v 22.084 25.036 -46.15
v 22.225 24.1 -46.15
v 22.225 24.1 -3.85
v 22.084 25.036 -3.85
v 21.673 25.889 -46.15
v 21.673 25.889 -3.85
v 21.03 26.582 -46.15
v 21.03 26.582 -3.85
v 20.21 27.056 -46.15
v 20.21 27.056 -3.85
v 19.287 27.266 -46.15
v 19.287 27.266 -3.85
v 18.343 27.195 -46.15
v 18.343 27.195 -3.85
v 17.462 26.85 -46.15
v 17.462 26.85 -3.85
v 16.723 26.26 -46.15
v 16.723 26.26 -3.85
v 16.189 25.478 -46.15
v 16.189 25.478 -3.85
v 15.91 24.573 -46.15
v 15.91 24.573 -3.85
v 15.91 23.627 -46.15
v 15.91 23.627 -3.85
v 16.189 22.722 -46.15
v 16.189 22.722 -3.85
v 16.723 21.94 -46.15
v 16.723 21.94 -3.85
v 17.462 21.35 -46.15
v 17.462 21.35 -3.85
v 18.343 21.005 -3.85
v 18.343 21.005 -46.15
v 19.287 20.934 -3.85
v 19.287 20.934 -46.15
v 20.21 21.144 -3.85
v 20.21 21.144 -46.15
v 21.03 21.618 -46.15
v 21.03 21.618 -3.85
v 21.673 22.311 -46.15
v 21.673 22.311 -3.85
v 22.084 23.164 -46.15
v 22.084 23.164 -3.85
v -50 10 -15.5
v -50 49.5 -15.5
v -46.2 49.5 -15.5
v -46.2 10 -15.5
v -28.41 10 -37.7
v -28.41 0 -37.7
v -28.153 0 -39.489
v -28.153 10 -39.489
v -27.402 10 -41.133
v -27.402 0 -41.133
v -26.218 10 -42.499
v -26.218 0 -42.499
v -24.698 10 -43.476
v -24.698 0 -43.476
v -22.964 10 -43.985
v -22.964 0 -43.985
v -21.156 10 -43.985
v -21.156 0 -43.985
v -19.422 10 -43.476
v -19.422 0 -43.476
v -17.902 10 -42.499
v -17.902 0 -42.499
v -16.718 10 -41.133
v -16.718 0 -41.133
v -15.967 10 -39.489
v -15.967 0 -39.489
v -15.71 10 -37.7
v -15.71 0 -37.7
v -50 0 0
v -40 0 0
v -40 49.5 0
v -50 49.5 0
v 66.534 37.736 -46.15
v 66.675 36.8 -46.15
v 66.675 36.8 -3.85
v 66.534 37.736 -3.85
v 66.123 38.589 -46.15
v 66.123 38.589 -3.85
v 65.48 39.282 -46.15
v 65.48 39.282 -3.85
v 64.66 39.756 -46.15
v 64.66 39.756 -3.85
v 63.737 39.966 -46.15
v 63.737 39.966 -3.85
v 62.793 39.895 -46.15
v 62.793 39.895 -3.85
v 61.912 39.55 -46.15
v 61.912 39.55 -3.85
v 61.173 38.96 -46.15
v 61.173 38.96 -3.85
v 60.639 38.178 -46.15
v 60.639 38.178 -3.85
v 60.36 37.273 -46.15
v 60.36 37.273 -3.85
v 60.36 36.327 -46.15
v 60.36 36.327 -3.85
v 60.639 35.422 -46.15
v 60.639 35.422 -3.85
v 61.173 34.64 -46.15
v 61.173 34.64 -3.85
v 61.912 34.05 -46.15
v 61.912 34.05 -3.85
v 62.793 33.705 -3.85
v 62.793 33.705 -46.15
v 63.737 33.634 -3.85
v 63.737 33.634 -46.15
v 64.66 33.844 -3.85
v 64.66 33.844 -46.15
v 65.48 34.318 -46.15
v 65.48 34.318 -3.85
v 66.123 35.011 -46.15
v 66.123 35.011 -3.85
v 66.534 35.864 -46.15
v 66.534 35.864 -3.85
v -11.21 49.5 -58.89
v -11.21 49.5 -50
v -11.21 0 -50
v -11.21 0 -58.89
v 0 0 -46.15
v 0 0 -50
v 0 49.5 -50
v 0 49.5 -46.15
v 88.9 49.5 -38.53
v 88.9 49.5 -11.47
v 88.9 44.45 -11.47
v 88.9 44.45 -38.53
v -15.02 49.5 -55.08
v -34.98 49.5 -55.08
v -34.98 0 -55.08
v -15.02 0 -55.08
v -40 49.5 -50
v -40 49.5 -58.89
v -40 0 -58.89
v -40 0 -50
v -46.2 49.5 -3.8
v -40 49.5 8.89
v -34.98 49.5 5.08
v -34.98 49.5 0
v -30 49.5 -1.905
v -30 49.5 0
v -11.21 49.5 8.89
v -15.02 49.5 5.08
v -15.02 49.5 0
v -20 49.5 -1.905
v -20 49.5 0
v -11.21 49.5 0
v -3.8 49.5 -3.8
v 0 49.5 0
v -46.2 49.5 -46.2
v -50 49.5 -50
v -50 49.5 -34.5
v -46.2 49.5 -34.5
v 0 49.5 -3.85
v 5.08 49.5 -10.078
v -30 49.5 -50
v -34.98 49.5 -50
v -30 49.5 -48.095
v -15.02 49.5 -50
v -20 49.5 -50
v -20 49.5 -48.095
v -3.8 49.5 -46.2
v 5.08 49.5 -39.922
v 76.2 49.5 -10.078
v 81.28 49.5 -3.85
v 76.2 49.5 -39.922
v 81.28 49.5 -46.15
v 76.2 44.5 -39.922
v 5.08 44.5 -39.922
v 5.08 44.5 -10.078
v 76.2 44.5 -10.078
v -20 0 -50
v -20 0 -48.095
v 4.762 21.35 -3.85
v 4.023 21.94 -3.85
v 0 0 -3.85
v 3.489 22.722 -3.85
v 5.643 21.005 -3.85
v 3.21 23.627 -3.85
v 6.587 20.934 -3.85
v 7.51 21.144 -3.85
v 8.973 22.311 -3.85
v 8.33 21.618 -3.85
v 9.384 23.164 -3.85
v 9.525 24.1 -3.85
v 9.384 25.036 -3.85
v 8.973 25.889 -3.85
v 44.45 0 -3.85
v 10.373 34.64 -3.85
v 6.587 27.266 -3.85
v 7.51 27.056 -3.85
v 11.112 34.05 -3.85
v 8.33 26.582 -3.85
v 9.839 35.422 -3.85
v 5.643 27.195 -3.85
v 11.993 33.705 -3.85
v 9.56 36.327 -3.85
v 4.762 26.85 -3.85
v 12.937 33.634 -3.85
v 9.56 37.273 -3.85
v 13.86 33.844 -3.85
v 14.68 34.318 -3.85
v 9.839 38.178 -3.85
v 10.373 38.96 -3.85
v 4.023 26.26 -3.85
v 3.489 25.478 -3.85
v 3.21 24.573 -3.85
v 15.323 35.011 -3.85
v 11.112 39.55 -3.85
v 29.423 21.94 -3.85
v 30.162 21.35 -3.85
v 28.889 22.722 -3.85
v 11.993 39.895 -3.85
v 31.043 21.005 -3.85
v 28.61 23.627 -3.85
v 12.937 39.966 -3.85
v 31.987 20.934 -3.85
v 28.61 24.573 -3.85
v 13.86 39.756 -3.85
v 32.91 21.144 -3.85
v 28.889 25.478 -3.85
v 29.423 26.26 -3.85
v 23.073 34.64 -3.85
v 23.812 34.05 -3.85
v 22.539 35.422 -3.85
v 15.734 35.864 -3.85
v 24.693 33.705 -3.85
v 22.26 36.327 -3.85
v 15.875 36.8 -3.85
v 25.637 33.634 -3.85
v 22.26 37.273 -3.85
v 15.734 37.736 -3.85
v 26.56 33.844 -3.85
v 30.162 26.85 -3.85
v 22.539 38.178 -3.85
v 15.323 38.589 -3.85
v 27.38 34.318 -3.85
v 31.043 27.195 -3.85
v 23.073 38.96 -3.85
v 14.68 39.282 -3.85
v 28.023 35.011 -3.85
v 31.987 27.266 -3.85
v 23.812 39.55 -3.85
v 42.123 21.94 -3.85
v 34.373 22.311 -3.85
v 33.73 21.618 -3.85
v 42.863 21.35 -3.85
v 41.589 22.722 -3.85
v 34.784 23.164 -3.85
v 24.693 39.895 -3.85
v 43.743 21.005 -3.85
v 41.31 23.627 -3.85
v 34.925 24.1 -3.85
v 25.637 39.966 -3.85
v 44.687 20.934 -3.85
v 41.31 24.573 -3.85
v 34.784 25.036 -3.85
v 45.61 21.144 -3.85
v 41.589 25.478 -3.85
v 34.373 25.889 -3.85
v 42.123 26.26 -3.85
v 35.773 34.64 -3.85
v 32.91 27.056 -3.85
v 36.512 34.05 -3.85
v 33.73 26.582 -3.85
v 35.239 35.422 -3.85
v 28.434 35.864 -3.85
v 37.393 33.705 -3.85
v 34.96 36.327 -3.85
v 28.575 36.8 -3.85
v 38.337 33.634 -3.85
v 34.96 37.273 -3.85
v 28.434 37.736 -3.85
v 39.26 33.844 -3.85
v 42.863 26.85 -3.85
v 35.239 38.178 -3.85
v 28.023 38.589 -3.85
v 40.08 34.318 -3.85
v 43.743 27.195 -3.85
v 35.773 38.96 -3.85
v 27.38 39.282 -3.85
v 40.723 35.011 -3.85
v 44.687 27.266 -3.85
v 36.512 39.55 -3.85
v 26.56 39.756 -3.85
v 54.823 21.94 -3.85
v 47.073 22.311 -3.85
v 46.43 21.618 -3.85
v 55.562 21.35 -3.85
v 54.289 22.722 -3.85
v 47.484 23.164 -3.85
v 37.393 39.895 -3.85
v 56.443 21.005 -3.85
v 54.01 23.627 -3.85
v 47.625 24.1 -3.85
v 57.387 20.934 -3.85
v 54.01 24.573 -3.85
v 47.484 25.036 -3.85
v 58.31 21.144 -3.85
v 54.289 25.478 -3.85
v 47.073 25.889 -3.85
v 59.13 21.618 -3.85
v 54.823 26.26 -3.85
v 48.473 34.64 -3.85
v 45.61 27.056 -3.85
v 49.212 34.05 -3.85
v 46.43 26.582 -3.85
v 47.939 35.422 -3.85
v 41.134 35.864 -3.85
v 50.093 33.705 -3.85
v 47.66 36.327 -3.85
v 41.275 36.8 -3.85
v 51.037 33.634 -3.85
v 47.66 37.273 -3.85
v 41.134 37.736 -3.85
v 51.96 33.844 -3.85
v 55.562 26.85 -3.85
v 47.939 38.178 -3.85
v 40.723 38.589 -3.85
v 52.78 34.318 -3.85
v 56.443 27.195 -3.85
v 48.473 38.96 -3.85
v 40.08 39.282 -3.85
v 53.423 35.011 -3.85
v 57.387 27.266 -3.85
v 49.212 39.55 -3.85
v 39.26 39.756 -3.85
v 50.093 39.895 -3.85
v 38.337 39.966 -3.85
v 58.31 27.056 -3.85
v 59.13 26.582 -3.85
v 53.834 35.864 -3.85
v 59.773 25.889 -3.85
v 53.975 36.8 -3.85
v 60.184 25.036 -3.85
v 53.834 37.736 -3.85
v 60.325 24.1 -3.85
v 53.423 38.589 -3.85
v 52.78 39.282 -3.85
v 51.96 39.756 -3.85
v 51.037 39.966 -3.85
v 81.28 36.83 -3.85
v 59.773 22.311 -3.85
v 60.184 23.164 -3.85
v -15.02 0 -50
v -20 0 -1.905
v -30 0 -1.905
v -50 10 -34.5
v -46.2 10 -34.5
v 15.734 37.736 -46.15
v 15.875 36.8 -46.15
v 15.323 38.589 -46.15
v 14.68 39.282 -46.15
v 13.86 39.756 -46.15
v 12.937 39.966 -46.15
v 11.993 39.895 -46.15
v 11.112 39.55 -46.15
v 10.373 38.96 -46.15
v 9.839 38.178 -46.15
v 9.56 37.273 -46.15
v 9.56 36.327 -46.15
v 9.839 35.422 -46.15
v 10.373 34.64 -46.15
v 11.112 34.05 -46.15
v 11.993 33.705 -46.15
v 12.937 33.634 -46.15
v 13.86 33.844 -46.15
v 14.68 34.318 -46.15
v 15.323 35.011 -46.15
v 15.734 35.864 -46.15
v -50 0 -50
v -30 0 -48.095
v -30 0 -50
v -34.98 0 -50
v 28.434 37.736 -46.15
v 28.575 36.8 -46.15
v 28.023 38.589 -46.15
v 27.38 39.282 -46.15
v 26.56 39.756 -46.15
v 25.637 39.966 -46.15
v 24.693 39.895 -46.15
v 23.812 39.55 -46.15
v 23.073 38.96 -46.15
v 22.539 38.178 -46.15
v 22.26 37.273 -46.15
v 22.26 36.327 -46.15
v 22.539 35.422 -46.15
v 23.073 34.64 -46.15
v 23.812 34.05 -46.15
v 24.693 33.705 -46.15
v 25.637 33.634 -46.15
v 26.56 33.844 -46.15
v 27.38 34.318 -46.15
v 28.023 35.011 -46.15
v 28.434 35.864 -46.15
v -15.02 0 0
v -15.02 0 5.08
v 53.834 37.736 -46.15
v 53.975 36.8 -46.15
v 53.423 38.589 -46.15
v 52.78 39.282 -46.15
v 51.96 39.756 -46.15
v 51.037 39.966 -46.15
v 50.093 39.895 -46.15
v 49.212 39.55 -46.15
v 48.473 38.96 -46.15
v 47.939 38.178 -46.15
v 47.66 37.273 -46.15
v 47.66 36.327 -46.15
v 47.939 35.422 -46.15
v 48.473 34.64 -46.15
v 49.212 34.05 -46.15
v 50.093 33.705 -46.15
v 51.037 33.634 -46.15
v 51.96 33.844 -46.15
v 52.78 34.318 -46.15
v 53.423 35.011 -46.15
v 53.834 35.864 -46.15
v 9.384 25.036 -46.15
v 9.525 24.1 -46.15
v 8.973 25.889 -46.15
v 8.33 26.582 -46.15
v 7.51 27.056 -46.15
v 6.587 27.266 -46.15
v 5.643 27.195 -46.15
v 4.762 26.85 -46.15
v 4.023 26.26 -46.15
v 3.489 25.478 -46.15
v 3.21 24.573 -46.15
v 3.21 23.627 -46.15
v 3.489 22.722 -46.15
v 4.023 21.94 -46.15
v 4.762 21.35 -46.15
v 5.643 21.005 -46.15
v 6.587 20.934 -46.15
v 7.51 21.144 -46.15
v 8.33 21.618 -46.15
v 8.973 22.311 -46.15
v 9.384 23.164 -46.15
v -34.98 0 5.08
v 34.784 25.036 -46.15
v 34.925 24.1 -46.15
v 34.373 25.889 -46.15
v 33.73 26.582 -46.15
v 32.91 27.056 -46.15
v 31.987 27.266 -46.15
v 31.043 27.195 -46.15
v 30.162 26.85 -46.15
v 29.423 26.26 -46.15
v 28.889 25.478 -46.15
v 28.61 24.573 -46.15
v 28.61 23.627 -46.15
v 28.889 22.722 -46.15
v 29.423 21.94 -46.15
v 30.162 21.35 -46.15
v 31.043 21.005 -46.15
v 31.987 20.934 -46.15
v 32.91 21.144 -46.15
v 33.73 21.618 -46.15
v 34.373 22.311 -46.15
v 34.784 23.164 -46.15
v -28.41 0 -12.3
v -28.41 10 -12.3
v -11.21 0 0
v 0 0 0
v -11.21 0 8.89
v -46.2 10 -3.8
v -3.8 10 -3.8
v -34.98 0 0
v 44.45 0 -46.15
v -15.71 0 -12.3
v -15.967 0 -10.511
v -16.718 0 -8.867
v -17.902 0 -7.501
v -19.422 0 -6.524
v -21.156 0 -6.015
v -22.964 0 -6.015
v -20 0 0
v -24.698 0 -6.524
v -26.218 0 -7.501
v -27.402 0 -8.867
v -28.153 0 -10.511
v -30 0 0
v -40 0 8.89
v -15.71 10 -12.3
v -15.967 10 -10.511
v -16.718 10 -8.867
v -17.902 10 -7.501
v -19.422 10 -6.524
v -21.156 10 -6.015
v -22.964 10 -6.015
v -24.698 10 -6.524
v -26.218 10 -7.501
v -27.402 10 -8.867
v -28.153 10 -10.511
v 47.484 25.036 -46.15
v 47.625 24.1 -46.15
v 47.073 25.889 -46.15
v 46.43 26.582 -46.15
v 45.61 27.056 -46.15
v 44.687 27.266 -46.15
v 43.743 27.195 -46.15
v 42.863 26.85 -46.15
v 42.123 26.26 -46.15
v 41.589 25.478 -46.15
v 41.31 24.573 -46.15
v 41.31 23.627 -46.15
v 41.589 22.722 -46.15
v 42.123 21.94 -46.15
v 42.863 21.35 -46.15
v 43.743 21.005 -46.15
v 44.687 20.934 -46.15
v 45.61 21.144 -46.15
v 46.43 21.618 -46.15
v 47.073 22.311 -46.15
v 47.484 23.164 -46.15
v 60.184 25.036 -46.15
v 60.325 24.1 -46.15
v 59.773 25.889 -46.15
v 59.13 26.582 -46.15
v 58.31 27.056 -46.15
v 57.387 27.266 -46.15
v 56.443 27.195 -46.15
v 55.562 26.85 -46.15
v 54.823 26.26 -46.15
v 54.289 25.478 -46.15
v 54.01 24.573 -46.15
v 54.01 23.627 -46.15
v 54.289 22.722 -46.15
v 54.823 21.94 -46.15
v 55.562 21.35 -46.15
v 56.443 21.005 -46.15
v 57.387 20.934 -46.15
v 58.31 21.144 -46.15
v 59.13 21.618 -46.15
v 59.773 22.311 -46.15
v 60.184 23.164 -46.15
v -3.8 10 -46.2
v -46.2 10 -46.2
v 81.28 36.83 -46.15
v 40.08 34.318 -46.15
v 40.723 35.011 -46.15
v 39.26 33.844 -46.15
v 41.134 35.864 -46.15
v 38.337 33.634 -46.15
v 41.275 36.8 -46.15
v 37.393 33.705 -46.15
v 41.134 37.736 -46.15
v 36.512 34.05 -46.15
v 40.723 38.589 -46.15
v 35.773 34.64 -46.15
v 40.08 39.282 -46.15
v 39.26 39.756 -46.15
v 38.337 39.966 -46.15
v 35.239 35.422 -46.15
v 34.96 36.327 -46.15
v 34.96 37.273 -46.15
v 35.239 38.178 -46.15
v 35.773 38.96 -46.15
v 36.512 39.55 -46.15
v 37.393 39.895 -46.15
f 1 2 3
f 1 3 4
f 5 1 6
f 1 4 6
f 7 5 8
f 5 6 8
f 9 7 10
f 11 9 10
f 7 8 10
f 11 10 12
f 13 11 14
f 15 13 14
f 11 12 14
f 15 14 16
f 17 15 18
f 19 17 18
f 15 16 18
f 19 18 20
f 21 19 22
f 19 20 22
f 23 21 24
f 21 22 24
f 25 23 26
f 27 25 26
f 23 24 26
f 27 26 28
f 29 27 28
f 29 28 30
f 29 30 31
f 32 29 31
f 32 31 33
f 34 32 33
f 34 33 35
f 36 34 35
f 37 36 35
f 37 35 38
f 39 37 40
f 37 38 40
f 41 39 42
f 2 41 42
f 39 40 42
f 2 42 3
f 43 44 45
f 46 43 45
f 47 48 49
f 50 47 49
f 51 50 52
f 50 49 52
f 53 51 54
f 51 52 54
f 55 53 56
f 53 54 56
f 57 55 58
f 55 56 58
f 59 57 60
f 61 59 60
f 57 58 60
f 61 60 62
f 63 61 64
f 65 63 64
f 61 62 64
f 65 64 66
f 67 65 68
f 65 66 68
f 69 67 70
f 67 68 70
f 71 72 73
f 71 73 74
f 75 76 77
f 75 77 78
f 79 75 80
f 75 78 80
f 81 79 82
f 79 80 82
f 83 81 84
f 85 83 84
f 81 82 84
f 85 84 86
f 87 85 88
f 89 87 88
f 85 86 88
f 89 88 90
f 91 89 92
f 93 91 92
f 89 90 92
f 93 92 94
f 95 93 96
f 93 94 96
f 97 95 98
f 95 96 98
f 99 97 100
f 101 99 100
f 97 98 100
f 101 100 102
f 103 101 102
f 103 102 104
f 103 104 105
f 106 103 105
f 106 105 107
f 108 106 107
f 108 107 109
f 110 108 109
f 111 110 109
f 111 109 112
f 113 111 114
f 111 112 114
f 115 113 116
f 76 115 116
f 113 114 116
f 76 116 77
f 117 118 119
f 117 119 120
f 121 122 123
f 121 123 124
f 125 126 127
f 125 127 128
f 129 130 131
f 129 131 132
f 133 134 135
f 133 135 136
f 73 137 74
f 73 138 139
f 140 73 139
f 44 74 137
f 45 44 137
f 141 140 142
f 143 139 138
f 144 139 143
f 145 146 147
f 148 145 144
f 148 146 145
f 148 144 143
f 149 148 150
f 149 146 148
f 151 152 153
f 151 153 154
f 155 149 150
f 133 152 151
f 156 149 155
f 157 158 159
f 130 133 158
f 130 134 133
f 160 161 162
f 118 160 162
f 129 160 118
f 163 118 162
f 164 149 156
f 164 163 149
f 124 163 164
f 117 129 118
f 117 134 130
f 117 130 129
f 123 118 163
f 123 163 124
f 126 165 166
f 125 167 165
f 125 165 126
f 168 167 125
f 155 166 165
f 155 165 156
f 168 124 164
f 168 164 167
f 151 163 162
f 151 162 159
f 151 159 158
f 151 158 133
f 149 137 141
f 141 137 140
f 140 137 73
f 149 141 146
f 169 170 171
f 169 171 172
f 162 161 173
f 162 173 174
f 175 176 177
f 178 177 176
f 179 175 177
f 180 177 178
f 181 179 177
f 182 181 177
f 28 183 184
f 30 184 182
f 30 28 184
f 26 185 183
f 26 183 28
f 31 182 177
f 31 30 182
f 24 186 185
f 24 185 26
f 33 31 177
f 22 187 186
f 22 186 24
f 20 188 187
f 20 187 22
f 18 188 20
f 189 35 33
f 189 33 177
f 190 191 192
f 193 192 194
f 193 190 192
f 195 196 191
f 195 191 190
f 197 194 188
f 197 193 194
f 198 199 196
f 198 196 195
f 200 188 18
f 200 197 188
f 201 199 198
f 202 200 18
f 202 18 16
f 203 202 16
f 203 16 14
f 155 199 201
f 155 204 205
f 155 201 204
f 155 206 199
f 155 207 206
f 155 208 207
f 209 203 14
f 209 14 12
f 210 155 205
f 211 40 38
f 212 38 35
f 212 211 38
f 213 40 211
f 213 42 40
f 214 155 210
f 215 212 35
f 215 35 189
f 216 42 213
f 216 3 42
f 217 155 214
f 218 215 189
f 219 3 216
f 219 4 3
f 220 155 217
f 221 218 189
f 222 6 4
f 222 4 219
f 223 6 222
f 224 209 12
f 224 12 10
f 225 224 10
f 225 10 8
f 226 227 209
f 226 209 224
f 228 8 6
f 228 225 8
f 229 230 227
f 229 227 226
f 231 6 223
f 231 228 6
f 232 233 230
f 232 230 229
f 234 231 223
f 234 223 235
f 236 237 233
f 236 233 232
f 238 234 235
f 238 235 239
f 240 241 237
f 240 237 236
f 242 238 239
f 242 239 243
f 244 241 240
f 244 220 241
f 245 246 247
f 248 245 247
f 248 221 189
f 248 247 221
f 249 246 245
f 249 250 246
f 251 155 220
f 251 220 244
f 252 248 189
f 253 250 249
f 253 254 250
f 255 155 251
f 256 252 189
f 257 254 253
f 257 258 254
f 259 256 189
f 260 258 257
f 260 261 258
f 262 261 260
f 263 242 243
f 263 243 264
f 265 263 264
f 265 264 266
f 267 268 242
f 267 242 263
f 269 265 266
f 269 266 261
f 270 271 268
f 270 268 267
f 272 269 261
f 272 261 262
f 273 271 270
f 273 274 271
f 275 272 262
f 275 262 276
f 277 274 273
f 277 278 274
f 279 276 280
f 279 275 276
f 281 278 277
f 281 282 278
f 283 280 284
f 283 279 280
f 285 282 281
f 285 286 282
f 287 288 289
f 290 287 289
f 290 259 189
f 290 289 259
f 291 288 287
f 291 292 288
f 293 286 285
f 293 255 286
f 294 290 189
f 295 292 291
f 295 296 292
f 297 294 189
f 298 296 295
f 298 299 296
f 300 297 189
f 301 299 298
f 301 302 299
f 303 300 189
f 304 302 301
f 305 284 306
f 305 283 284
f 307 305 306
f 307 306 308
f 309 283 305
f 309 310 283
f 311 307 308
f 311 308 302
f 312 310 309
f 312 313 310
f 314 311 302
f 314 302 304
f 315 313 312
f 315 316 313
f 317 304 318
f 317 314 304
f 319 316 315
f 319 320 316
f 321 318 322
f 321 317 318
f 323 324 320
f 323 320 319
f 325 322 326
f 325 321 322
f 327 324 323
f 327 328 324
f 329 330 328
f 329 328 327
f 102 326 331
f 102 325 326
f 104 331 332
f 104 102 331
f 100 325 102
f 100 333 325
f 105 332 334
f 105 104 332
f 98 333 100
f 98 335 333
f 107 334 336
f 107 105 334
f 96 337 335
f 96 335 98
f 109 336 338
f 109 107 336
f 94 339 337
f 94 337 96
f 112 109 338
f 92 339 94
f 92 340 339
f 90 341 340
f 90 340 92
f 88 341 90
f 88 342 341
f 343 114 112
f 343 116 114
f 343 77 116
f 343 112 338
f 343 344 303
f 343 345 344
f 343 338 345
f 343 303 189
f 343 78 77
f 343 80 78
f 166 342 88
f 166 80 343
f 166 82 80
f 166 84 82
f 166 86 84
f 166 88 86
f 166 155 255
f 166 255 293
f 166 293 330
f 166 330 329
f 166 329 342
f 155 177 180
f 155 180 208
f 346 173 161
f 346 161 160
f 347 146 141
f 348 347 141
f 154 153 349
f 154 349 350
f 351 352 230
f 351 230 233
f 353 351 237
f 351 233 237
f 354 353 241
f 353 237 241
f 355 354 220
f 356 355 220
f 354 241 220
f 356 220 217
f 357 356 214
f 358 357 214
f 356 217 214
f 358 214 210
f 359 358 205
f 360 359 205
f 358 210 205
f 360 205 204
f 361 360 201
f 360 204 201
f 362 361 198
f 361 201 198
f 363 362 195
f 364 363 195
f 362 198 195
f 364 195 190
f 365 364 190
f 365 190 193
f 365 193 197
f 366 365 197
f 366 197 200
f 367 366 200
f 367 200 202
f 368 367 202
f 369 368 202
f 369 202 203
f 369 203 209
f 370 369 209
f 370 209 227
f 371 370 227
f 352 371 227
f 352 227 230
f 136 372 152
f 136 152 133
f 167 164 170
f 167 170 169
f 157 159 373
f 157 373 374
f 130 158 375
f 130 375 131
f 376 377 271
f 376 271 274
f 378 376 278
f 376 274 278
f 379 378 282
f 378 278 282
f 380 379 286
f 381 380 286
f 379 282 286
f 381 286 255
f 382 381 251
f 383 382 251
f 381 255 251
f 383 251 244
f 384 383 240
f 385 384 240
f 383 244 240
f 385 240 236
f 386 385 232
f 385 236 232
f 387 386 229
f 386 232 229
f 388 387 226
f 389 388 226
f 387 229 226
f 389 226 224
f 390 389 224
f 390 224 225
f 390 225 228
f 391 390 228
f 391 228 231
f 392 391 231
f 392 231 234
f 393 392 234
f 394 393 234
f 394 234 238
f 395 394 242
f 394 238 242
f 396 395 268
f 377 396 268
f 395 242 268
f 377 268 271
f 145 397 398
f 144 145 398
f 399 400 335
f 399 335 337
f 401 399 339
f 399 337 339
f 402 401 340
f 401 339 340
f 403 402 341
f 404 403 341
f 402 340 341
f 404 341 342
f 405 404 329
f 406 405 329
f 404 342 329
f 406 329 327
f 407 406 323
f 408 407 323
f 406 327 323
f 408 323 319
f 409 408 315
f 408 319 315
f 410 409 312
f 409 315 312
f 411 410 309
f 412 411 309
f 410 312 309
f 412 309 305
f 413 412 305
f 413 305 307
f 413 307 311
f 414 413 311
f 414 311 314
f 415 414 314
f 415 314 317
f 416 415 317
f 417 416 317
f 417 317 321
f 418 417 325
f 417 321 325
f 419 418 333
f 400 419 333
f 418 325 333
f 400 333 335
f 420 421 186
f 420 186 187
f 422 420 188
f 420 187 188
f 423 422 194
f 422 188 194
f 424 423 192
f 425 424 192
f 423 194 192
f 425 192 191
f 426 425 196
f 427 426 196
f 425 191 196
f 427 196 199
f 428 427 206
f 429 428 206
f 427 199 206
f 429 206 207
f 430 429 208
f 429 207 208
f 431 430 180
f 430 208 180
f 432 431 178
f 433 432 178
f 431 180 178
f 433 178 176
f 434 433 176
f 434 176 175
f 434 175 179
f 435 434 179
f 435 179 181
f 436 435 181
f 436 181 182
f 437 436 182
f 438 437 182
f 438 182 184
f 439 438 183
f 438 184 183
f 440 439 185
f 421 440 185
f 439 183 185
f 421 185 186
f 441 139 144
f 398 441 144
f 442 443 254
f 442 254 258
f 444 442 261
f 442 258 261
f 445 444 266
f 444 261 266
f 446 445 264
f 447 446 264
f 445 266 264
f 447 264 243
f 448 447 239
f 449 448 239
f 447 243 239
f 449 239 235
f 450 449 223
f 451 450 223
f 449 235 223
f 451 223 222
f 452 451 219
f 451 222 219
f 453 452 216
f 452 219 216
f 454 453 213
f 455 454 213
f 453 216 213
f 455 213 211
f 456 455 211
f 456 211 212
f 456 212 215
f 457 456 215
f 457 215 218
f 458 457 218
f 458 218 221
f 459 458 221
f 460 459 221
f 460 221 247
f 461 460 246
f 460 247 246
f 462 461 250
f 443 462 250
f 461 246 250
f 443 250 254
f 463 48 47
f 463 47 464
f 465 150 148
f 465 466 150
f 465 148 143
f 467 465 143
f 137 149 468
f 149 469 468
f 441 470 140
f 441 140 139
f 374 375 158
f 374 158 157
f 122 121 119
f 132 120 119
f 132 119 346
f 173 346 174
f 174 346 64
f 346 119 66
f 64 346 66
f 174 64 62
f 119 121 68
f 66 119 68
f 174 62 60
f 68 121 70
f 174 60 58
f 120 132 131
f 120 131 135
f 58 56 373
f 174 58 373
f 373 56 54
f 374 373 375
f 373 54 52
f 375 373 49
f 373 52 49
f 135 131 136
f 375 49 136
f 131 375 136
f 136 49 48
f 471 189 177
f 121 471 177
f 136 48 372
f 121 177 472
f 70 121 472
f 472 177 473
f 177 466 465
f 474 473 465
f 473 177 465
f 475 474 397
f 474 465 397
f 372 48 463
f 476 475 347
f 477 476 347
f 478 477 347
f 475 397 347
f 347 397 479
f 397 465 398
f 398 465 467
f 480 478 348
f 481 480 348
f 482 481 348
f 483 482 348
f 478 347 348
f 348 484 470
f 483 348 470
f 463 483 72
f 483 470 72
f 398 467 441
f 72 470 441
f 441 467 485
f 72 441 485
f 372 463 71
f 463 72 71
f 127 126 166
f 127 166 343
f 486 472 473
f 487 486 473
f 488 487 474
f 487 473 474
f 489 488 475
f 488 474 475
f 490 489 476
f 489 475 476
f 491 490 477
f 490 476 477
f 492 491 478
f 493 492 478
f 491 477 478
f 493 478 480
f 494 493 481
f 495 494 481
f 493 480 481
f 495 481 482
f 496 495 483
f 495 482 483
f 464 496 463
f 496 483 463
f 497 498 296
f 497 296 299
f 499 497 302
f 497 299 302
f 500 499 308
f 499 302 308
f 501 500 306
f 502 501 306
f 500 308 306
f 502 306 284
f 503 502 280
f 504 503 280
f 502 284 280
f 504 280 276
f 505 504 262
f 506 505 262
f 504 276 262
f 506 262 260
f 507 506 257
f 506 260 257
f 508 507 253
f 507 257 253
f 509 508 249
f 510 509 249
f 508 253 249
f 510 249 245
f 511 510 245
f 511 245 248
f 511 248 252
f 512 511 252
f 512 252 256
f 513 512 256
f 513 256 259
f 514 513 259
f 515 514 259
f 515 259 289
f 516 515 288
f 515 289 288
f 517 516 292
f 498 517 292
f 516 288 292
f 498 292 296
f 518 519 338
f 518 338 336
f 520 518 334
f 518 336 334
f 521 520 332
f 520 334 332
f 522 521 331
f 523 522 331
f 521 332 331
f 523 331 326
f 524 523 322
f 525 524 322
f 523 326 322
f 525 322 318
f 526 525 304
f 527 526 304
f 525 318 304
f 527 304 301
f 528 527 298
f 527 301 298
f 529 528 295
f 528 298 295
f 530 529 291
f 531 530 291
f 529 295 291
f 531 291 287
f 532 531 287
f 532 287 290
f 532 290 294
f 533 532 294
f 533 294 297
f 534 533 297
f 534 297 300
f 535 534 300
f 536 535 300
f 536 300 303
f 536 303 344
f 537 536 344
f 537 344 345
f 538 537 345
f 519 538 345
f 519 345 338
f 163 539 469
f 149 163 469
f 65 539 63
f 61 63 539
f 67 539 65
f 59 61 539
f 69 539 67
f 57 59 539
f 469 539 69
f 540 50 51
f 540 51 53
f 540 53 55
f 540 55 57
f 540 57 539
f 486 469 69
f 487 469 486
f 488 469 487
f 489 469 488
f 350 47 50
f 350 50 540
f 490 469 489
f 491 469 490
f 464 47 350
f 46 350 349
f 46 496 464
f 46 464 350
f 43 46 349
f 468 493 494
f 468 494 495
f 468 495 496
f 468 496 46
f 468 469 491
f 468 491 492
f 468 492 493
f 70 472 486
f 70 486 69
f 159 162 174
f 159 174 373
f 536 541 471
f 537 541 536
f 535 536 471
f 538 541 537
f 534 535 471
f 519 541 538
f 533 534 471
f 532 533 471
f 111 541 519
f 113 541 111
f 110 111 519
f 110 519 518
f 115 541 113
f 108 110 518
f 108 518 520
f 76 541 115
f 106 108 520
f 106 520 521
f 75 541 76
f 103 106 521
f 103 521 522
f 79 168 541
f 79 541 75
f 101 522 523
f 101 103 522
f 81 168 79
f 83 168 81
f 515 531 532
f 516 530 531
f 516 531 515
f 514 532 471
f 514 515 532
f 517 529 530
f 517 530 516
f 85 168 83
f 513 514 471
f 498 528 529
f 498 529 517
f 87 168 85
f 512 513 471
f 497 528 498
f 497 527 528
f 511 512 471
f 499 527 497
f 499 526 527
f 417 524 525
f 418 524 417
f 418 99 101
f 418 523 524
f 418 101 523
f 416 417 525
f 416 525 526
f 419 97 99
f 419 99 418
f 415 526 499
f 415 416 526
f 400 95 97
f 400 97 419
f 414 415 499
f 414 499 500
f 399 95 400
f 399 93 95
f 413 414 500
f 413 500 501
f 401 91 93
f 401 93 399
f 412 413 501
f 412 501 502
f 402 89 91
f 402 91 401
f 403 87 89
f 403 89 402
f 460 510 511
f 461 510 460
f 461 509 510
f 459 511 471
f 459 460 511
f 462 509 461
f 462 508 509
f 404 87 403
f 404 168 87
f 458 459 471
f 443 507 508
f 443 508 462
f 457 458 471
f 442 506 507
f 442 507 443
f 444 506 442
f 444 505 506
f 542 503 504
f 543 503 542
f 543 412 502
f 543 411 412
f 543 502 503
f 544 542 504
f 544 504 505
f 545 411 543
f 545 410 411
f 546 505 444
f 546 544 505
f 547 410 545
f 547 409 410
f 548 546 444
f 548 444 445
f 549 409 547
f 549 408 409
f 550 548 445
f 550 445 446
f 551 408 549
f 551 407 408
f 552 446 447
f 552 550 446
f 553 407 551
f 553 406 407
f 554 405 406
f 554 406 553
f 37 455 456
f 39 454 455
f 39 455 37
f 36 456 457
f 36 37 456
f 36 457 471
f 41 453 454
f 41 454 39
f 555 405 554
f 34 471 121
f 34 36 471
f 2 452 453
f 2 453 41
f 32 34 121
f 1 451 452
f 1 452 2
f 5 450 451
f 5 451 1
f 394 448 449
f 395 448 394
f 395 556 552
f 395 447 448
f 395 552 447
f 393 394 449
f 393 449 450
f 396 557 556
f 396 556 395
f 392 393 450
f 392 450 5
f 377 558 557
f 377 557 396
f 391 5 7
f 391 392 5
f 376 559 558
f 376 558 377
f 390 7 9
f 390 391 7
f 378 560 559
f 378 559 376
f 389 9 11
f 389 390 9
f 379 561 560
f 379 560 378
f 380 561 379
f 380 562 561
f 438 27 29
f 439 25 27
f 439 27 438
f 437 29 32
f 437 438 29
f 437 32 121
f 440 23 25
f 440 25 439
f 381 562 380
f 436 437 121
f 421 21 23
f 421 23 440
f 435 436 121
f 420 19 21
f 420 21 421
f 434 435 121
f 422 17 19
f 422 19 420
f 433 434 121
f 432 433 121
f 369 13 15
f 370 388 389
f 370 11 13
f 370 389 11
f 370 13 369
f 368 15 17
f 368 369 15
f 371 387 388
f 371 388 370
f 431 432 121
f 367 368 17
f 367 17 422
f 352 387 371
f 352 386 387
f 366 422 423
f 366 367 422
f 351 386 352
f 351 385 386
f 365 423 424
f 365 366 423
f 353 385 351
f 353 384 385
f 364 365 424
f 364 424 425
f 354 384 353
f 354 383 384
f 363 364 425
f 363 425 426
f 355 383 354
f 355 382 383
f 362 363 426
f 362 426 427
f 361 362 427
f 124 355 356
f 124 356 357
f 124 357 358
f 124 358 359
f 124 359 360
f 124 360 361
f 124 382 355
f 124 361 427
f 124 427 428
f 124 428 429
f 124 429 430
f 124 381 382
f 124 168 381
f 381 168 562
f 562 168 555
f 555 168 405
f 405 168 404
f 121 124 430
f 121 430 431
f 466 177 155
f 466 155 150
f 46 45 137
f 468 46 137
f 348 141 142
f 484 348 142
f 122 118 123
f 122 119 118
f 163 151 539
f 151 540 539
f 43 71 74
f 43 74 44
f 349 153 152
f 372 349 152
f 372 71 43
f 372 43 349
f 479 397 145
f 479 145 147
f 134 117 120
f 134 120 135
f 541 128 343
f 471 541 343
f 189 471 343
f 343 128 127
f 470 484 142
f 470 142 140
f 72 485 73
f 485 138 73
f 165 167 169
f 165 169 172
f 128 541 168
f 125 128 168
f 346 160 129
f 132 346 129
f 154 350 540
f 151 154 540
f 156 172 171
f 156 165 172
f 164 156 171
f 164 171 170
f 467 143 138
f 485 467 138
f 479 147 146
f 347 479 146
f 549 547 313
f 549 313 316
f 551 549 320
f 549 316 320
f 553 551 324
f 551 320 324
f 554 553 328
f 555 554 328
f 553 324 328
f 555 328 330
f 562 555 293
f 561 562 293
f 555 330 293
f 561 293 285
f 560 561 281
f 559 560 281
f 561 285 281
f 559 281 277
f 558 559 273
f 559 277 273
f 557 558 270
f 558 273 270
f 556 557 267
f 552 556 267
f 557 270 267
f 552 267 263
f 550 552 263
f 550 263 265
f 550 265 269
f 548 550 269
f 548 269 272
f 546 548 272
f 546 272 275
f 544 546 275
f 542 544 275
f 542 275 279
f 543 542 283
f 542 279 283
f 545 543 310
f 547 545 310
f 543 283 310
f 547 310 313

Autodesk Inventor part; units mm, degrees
ref_plane "YZ Plane" through (0, 0, 0) normal (1, 0, 0) x (0, 1, 0)
ref_plane "XZ Plane" through (0, 0, 0) normal (0, 1, 0) x (-1, 0, 0)
ref_plane "XY Plane" through (0, 0, 0) normal (0, 0, 1) x (1, 0, 0)
sketch "Sketch1" plane through (0, 0, 0) normal (0, 1, 0) x (-1, 0, 0)
  line L0 (0, 0) -> (50, 0)
  line L1 (50, 0) -> (50, -50)
  line L2 (50, -50) -> (0, -50)
  line L3 (0, -50) -> (0, 0)
  dimension "d0" = 50
extrude "Extrusion1" add sketch "Sketch1" along normal blind 10
sketch "Sketch2" plane through (0, 10, 0) normal (0, 1, 0) x (1, 0, 0)
  line L0 (0, 50) -> (-50, 50) construction
  line L1 (-50, 0) -> (0, 0) construction
  line L2 (0, 0) -> (0, 50) construction
  line L3 (-46.2, 46.2) -> (-3.8, 46.2)
  line L4 (-3.8, 46.2) -> (-3.8, 3.8)
  line L5 (-3.8, 3.8) -> (-46.2, 3.8)
  line L6 (0, 0) -> (-50, 0)
  line L7 (0, 0) -> (0, 50)
  line L8 (0, 50) -> (-50, 50)
  line L9 (-50, 50) -> (-50, 0) construction
  line L10 (-46.2, 34.5) -> (-46.2, 15.5)
  line L11 (-50, 50) -> (-50, 34.5)
  line L12 (-50, 34.5) -> (-46.2, 34.5)
  line L13 (-46.2, 34.5) -> (-46.2, 46.2)
  line L14 (-46.2, 0) -> (-50, 0)
  line L15 (-50, 0) -> (-50, 15.5)
  line L16 (-50, 15.5) -> (-46.2, 15.5)
  line L17 (-46.2, 15.5) -> (-46.2, 3.8)
  point P0 (0, 25)
  point P1 (-3.8, 25)
  point P2 (-25, 46.2)
  point P3 (-25, 50)
  point P4 (-46.2, 50)
  point P5 (-46.2, 25)
  dimension "d6" = 42.4
  dimension "d7" = 42.4
  dimension "d10" = 19
  dimension "d11" = 3.8
extrude "Extrusion2" add sketch "Sketch2" along normal blind 39.5 contours L13 L12 L11 L8 L7 L6 L15 L16 L17 L5 L4 L3
sketch "Sketch3" plane through (0, 49.5, 0) normal (0, 1, 0) x (1, 0, 0)
  line L0 (0, 0) -> (0, 50) construction
  line L1 (0, 50) -> (-50, 50) construction
  line L2 (-46.2, 46.2) -> (-3.8, 46.2) construction
  line L3 (-20, 50) -> (-20, 48.095)
  line L4 (-20, 48.095) -> (-30, 48.095)
  line L5 (-30, 48.095) -> (-30, 50)
  line L6 (-30, 50) -> (-20, 50)
  line L7 (0, 25) -> (-50, 25)
  line L8 (-50, 34.5) -> (-50, 15.5) construction
  line L9 (0, 0) -> (-50, 0) construction
  line L10 (-46.2, 3.8) -> (-3.8, 3.8) construction
  line L11 (-20, 0) -> (-20, 1.905)
  line L12 (-20, 1.905) -> (-30, 1.905)
  line L13 (-30, 1.905) -> (-30, 0)
  line L14 (-30, 0) -> (-20, 0)
  point P0 (-25, 48.095)
  point P1 (-25, 50)
  point P2 (-25, 1.905)
  point P3 (-25, 0)
  dimension "d12" = 1.905
  dimension "d13" = 10
extrude "Extrusion3" cut sketch "Sketch3" against normal through all
sketch "Sketch4" plane through (0, 49.5, 0) normal (0, 1, 0) x (1, 0, 0)
  line L0 (-3.8, 46.2) -> (-3.8, 3.8) construction
  line L1 (0, 0) -> (0, 50) construction
  line L2 (0, 3.85) -> (88.9, 3.85)
  line L3 (88.9, 3.85) -> (88.9, 46.15)
  line L4 (88.9, 46.15) -> (0, 46.15)
  line L5 (0, 3.85) -> (0, 46.15)
  point P0 (-3.8, 25)
  point P1 (88.9, 25)
  dimension "d16" = 88.9
  dimension "d17" = 42.3
extrude "Extrusion4" add sketch "Sketch4" against normal blind 49.5
chamfer "Chamfer1" distance 7.62 angle 45 2 edges at (88.9, 24.75, -3.85) (88.9, 24.75, -46.15)
chamfer "Chamfer2" distance 44.45 angle 45 1 edges at (88.9, 0, -25)
sketch "Sketch5" plane through (0, 0, -3.85) normal (0, 0, 1) x (1, 0, 0)
  line L0 (0, 49.5) -> (81.28, 49.5) construction
  line L1 (0, 0) -> (0, 49.5) construction
  circle A0 centre (12.7, 36.8) radius 3.175
  circle A1 centre (25.4, 36.8) radius 3.175
  circle A2 centre (38.1, 36.8) radius 3.175
  circle A3 centre (50.8, 36.8) radius 3.175
  circle A4 centre (63.5, 36.8) radius 3.175
  circle A5 centre (6.35, 24.1) radius 3.175
  circle A6 centre (19.05, 24.1) radius 3.175
  circle A7 centre (31.75, 24.1) radius 3.175
  circle A8 centre (44.45, 24.1) radius 3.175
  circle A9 centre (57.15, 24.1) radius 3.175
  dimension "d26" = 6.35
  dimension "d27" = 12.7
  dimension "d28" = 12.7
  dimension "d29" = 12.7
  dimension "d30" = 12.7
  dimension "d31" = 12.7
  dimension "d32" = 12.7
  dimension "d33" = 6.35
  dimension "d34" = 12.7
  dimension "d35" = 12.7
  dimension "d36" = 12.7
  dimension "d37" = 12.7
  dimension "d38" = 12.7
  dimension "d39" = 6.35
extrude "Extrusion5" cut sketch "Sketch5" against normal through all
sketch "Sketch6" plane through (0, 49.5, 0) normal (0, 1, 0) x (1, 0, 0)
  line L0 (88.9, 11.47) -> (88.9, 38.53) construction
  line L1 (76.2, 10.0775) -> (5.08, 10.0775)
  line L2 (5.08, 10.0775) -> (5.08, 39.9225)
  line L3 (5.08, 39.9225) -> (76.2, 39.9225)
  line L4 (76.2, 39.9225) -> (76.2, 10.0775)
  point P0 (76.2, 25)
  point P1 (88.9, 25)
  dimension "d42" = 71.12
  dimension "d43" = 29.845
  dimension "d44" = 12.7
extrude "Extrusion6" cut sketch "Sketch6" against normal blind 5
sketch "Sketch7" plane through (0, 49.5, 0) normal (0, 1, 0) x (1, 0, 0)
  line L0 (-20, 50) -> (-20, 48.095) construction
  line L1 (-30, 48.095) -> (-30, 50) construction
  line L2 (-30, 50) -> (-50, 50) construction
  line L3 (-3.8, 46.2) -> (-3.8, 3.8) construction
  line L4 (-50, 0) -> (-30, 0) construction
  line L5 (-30, 0) -> (-30, 1.905) construction
  line L6 (-30, 1.905) -> (-20, 1.905) construction
  line L7 (-20, 0) -> (0, 0) construction
  line L8 (-34.98, -5.08) -> (-15.02, -5.08)
  line L9 (-34.98, 0) -> (-34.98, -5.08)
  line L10 (-15.02, 0) -> (-15.02, -5.08)
  line L11 (-11.21, 0) -> (-11.21, -8.89)
  line L12 (-11.21, -8.89) -> (-40, -8.89)
  line L13 (-40, -8.89) -> (-40, 0)
  line L14 (-50, 34.5) -> (-50, 15.5) construction
  line L15 (-50, 25) -> (-3.8, 25)
  line L16 (-15.02, 50) -> (-15.02, 55.08)
  line L17 (-34.98, 55.08) -> (-15.02, 55.08)
  line L18 (-34.98, 50) -> (-34.98, 55.08)
  line L19 (-11.21, 50) -> (-11.21, 58.89)
  line L20 (-11.21, 58.89) -> (-40, 58.89)
  line L21 (-40, 58.89) -> (-40, 50)
  line L22 (-50, 0) -> (-30, 0) construction
  line L23 (-40, 0) -> (-34.98, 0)
  line L24 (-15.02, 0) -> (-11.21, 0)
  line L25 (-11.21, 50) -> (-15.02, 50)
  line L26 (-34.98, 50) -> (-40, 50)
  point P0 (-25, 1.905)
  point P1 (-25, -5.08)
  point P2 (-25, 55.08)
  dimension "d49" = 5.08
  dimension "d50" = 19.96
  dimension "d52" = 3.81
  dimension "d53" = 3.81
extrude "Extrusion7" add sketch "Sketch7" against normal blind 49.5
sketch "Sketch8" plane through (0, 0, 0) normal (0, -1, 0) x (1, 0, 0)
  line L0 (-50, -50) -> (-50, 0) construction
  line L1 (-22.06, -37.7) -> (-22.06, -12.3) construction
  line L2 (-28.41, -37.7) -> (-28.41, -12.3)
  line L3 (-15.71, -12.3) -> (-15.71, -37.7)
  arc A0 (-28.41, -37.7) -> (-15.71, -37.7) centre (-22.06, -37.7) ccw
  arc A1 (-15.71, -12.3) -> (-28.41, -12.3) centre (-22.06, -12.3) ccw
  point P0 (-22.06, -25)
  point P1 (-50, -25)
  dimension "d56" = 12.7
  dimension "d57" = 21.59
  dimension "d58" = 25.4
extrude "Extrusion8" cut sketch "Sketch8" against normal blind 25.4
properties part number "StepperMotorHolder"
